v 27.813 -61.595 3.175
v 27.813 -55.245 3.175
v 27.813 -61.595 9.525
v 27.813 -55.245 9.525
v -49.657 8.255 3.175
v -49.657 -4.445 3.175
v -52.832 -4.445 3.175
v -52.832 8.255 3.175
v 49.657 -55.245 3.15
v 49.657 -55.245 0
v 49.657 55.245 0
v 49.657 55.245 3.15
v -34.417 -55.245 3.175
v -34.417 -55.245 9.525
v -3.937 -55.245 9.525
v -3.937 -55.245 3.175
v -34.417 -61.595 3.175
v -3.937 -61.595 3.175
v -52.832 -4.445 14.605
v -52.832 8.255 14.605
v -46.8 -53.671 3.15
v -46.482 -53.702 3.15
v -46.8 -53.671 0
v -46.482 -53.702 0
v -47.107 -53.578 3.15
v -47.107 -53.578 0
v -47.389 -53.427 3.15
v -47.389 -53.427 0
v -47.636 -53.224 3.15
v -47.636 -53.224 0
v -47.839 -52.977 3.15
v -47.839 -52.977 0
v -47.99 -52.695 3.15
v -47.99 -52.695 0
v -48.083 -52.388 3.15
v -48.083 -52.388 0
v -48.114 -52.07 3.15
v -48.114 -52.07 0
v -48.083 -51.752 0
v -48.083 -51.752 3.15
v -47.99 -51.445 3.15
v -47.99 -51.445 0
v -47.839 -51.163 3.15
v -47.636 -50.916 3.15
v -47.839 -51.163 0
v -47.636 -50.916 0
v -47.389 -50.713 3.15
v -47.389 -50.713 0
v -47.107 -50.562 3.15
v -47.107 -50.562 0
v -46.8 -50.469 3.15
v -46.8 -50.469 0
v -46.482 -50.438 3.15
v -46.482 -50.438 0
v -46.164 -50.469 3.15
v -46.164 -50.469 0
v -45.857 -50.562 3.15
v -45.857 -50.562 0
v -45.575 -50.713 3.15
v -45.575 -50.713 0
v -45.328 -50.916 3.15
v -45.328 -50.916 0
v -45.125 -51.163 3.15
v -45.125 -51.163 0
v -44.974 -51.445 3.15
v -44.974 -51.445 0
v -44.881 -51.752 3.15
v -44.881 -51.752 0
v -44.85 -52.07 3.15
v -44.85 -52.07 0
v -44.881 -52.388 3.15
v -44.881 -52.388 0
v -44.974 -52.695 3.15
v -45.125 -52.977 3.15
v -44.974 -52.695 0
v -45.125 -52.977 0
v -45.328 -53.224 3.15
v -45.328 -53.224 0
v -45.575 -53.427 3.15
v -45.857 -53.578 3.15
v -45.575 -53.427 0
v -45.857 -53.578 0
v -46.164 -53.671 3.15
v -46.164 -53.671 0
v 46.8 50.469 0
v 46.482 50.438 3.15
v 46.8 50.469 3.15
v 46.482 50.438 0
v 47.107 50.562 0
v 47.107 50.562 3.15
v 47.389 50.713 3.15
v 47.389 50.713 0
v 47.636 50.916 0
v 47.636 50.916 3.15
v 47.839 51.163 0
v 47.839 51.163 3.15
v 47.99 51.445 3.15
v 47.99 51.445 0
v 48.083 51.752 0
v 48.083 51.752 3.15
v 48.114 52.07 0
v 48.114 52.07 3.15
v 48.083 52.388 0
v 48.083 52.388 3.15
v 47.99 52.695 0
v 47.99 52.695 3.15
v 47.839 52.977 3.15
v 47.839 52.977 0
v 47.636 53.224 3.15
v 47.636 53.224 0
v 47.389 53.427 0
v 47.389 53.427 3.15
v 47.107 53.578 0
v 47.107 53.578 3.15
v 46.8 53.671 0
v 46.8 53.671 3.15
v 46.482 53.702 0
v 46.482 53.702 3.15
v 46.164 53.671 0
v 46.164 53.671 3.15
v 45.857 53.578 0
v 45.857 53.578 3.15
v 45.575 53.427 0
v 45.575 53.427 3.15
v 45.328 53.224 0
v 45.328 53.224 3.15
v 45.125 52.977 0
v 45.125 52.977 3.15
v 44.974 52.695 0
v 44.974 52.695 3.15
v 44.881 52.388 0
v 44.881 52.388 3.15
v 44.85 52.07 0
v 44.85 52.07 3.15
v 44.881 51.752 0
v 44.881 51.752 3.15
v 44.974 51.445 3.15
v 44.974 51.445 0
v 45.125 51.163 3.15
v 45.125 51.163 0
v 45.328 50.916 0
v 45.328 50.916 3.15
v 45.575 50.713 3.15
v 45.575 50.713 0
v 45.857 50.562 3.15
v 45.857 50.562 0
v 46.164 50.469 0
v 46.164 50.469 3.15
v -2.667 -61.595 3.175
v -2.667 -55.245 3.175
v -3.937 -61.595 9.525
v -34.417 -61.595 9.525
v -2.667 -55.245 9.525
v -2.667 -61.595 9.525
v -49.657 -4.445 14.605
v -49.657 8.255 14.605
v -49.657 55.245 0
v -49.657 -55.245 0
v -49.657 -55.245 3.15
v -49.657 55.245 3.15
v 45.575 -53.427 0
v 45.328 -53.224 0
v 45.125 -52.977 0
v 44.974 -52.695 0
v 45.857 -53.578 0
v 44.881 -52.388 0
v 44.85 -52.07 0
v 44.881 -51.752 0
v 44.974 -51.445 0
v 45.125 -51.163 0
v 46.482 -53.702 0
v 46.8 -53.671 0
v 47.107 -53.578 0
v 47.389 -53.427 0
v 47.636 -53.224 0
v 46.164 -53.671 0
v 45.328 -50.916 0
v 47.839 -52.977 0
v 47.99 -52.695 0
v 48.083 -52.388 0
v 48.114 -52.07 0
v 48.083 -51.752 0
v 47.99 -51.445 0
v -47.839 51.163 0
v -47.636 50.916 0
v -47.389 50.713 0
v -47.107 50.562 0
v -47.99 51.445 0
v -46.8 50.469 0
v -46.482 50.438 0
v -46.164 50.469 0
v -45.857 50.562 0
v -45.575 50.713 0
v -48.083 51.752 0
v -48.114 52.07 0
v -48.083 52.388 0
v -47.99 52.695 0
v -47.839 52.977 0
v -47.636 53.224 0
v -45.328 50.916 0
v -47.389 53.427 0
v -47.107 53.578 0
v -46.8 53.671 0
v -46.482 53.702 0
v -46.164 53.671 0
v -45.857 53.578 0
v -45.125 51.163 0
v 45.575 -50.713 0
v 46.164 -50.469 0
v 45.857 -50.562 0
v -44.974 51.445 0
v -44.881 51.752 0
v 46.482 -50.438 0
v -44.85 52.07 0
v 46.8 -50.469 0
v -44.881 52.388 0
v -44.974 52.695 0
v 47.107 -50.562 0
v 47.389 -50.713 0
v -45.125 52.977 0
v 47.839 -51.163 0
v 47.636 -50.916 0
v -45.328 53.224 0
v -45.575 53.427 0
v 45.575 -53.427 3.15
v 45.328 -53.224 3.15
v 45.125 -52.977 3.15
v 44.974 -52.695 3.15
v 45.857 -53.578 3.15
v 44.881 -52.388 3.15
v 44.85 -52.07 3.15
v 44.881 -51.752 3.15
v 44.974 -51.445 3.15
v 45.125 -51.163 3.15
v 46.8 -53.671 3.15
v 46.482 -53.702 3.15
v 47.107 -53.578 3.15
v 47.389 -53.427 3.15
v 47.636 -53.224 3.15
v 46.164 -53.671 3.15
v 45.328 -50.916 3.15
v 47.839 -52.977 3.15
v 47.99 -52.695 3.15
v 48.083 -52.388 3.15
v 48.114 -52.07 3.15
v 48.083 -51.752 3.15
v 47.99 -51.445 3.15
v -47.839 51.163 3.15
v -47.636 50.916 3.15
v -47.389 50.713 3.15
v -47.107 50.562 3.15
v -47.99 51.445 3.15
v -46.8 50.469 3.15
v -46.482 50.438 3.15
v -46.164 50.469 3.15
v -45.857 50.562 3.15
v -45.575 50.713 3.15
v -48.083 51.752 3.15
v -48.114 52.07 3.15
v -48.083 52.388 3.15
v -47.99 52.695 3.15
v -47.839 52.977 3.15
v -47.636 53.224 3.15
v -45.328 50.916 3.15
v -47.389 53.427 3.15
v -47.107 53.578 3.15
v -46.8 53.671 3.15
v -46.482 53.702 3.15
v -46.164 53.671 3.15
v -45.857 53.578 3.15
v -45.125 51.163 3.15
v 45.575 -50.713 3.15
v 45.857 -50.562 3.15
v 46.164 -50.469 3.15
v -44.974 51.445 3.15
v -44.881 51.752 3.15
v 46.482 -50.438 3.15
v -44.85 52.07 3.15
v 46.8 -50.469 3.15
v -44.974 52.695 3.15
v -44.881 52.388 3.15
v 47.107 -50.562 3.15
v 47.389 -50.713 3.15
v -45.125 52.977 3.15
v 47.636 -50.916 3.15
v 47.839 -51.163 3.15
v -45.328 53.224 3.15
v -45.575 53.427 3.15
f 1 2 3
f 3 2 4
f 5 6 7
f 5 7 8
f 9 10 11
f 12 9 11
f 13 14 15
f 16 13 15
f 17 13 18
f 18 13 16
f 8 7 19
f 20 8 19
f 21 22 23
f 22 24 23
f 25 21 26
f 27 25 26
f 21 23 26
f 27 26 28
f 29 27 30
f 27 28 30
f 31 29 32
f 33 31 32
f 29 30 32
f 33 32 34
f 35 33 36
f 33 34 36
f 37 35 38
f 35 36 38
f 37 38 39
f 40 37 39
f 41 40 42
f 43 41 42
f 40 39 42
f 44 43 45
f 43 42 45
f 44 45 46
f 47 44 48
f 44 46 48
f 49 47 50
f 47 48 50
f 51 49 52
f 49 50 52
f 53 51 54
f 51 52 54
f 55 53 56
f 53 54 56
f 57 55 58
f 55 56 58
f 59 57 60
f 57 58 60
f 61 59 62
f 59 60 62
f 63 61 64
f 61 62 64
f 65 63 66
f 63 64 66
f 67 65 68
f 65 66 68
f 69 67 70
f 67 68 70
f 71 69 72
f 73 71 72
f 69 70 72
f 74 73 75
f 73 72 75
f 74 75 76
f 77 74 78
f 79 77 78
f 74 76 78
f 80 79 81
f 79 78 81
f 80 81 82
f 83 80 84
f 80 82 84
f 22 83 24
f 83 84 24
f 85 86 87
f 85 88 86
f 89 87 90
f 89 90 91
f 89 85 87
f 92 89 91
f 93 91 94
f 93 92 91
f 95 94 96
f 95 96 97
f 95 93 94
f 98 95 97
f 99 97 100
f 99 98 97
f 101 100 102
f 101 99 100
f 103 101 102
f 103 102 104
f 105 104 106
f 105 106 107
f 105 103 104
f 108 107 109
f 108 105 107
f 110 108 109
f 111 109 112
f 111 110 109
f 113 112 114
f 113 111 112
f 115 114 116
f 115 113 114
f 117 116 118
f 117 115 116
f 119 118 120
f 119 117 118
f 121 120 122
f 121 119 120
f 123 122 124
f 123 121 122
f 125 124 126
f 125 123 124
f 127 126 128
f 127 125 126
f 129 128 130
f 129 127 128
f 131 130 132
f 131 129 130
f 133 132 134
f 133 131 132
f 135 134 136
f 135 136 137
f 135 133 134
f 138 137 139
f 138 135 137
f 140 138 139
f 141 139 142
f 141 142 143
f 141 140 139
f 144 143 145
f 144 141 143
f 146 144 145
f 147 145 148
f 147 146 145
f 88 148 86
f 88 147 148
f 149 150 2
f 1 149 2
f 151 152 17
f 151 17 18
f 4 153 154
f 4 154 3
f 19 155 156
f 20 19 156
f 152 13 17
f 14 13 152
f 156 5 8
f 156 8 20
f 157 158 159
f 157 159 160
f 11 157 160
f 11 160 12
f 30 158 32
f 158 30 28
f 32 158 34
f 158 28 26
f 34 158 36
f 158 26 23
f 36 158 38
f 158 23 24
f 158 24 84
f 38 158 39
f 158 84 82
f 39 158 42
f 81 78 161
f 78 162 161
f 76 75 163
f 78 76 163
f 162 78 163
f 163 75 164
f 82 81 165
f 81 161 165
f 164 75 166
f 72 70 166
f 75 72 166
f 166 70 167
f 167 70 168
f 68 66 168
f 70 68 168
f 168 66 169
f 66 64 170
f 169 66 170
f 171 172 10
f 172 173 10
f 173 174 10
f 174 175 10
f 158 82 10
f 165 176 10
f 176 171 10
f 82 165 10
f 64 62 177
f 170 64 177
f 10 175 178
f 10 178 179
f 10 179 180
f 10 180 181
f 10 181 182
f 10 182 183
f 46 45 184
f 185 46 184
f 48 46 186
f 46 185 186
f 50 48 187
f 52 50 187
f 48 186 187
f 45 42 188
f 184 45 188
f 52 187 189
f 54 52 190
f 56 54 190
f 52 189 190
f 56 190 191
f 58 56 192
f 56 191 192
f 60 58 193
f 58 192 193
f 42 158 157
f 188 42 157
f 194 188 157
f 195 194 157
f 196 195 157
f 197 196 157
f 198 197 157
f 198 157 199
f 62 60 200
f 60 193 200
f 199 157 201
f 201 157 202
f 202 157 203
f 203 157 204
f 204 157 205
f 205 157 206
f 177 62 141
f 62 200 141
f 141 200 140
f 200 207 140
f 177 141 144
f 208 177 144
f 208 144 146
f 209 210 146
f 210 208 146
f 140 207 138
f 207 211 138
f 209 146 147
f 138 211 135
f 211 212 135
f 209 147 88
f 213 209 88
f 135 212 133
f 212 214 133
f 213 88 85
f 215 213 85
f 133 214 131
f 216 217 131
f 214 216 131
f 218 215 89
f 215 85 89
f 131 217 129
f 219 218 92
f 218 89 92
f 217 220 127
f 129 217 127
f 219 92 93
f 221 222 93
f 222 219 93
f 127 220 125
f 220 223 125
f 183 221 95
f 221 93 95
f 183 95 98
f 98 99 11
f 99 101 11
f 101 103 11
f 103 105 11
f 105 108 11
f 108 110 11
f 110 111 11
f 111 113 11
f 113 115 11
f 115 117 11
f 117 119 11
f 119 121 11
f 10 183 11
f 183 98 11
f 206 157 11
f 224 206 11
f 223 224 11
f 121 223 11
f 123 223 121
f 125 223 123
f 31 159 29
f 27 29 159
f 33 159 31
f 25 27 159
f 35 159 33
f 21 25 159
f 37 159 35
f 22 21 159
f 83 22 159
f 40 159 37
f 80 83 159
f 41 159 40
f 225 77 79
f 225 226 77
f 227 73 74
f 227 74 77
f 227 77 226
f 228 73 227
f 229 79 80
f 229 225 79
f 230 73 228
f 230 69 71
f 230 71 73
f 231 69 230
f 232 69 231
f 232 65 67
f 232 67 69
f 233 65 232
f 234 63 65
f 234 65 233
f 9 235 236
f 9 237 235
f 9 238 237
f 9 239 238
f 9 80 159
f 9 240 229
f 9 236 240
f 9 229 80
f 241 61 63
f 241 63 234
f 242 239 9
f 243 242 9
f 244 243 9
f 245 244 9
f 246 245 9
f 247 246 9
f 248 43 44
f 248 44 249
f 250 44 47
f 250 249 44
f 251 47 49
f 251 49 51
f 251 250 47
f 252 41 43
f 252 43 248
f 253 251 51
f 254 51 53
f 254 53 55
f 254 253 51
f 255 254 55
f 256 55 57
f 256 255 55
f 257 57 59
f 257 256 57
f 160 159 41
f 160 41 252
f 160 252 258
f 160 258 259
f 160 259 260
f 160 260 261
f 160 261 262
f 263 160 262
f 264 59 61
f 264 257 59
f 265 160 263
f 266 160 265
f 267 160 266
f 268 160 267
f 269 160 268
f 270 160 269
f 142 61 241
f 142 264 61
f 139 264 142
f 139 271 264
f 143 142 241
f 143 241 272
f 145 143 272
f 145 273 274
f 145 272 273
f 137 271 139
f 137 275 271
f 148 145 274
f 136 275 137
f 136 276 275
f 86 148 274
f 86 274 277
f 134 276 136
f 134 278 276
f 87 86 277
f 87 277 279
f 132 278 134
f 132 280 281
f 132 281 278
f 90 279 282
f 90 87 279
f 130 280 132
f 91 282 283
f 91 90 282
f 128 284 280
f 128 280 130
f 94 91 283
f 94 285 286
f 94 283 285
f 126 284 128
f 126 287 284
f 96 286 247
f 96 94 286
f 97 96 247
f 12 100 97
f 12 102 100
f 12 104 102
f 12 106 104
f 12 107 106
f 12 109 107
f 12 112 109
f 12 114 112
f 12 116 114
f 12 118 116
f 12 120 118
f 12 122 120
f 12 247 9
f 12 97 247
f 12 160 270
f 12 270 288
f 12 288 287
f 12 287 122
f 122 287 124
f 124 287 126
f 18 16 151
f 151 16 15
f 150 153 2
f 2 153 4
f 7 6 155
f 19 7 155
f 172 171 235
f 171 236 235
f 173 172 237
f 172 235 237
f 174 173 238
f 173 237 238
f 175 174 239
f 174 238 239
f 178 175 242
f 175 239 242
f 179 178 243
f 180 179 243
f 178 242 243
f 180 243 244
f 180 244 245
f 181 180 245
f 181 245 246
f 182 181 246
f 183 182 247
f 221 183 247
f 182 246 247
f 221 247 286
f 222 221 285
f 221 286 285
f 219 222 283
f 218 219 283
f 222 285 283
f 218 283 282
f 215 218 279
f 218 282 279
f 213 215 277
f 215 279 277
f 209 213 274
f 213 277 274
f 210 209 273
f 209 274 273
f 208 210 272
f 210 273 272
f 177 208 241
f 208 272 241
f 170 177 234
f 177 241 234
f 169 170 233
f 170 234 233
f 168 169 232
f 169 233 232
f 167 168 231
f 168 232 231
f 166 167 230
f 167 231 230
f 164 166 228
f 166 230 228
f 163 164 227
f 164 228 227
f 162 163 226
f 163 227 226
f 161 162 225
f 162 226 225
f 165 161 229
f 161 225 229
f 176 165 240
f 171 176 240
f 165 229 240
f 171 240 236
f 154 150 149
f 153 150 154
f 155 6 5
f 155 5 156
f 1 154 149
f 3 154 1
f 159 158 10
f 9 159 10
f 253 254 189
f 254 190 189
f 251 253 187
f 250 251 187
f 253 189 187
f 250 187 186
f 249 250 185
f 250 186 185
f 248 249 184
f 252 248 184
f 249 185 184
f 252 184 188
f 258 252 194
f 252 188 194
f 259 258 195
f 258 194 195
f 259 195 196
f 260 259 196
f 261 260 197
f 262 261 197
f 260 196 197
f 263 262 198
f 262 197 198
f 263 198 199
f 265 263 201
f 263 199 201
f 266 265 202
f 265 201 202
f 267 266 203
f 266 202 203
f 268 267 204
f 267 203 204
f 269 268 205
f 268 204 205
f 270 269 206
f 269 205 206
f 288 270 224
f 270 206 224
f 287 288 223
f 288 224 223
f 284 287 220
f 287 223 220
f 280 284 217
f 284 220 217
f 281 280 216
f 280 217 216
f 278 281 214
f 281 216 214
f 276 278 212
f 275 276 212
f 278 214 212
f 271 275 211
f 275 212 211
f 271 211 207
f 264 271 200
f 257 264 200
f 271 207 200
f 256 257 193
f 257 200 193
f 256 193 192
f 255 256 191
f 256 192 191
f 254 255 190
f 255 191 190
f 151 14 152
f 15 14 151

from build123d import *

# Parameters (mm, degrees)
SKETCH1_W                      = 99.314
SKETCH1_H                      = 110.49
EXTRUDE1_DEPTH                 = 3.1496
SKETCH2_W                      = 30.48
SKETCH2_H                      = 6.35
EXTRUDE2_DEPTH                 = 6.35
EXTRUDE2_2_DEPTH               = 6.35
SKETCH3_W                      = 11.43
SKETCH3_H                      = 12.7
EXTRUDE3_DEPTH                 = 3.175
SKETCH5_W                      = 1.63195
SKETCH5_H                      = 3.1496
F_4_CLEARANCE_HOLE1_AT_2_COUNT = 2
F_4_CLEARANCE_HOLE1_AT_2_PITCH = 104.14
MIRROR1_COPY_1_SKETCH_W        = 1.63195
MIRROR1_COPY_1_SKETCH_H        = 3.1496


with BuildPart() as part:
    # Sketch1 → Extrude1 (new body)
    with BuildSketch(Plane.XY):
        Rectangle(SKETCH1_W, SKETCH1_H)
    extrude(amount=EXTRUDE1_DEPTH)

    # Sketch5 → #4 Clearance Hole1 (revolve, cut)
    with BuildSketch(Plane(origin=(-46.482, 52.07, 3.1496), x_dir=(0, -1, 0), z_dir=(1, 0, 0))):
        with Locations((0.815975, 1.5748)):
            Rectangle(SKETCH5_W, SKETCH5_H)
    f_4_clearance_hole1 = revolve(axis=Axis((-46.482, 52.07, 9.4996), (0, 0, -1)), mode=Mode.SUBTRACT)

    # #4 Clearance Hole1 at 2: #4 Clearance Hole1 ×2
    with Locations(*[(0, -i * F_4_CLEARANCE_HOLE1_AT_2_PITCH, 0) for i in range(1, F_4_CLEARANCE_HOLE1_AT_2_COUNT)]):
        add(f_4_clearance_hole1, mode=Mode.SUBTRACT)

    # Mirror1: #4 Clearance Hole1 across plane
    add(f_4_clearance_hole1.mirror(Plane(origin=(0, 0, 0), x_dir=(0, 0, 1), z_dir=(1, 0, 0))), mode=Mode.SUBTRACT)

    # Mirror1 copy 1 sketch → Mirror1 copy 1 (revolve, cut)
    with BuildSketch(Plane(origin=(46.482, -52.07, 3.1496), x_dir=(0, -1, 0), z_dir=(-1, 0, 0))):
        with Locations((0.815975, -1.5748)):
            Rectangle(MIRROR1_COPY_1_SKETCH_W, MIRROR1_COPY_1_SKETCH_H)
    revolve(axis=Axis((46.482, -52.07, 9.4996), (0, 0, 1)), mode=Mode.SUBTRACT)


with BuildPart() as body_2:
    # Sketch2 → Extrude2 (new body)
    with BuildSketch(Plane.XZ.offset(55.245)):
        with Locations((-19.177, 6.35)):
            Rectangle(SKETCH2_W, SKETCH2_H)
    extrude(amount=EXTRUDE2_DEPTH)


with BuildPart() as body_3:
    # Sketch2 → Extrude2 2 (new body)
    with BuildSketch(Plane.XZ.offset(55.245)):
        with Locations((12.573, 6.35)):
            Rectangle(SKETCH2_W, SKETCH2_H)
    extrude(amount=EXTRUDE2_2_DEPTH)


with BuildPart() as body_4:
    # Sketch3 → Extrude3 (new body)
    with BuildSketch(Plane.ZY.offset(49.657)):
        with Locations((8.89, 1.905)):
            Rectangle(SKETCH3_W, SKETCH3_H)
    extrude(amount=EXTRUDE3_DEPTH)


solid = Compound([part.part, body_2.part, body_3.part, body_4.part])
